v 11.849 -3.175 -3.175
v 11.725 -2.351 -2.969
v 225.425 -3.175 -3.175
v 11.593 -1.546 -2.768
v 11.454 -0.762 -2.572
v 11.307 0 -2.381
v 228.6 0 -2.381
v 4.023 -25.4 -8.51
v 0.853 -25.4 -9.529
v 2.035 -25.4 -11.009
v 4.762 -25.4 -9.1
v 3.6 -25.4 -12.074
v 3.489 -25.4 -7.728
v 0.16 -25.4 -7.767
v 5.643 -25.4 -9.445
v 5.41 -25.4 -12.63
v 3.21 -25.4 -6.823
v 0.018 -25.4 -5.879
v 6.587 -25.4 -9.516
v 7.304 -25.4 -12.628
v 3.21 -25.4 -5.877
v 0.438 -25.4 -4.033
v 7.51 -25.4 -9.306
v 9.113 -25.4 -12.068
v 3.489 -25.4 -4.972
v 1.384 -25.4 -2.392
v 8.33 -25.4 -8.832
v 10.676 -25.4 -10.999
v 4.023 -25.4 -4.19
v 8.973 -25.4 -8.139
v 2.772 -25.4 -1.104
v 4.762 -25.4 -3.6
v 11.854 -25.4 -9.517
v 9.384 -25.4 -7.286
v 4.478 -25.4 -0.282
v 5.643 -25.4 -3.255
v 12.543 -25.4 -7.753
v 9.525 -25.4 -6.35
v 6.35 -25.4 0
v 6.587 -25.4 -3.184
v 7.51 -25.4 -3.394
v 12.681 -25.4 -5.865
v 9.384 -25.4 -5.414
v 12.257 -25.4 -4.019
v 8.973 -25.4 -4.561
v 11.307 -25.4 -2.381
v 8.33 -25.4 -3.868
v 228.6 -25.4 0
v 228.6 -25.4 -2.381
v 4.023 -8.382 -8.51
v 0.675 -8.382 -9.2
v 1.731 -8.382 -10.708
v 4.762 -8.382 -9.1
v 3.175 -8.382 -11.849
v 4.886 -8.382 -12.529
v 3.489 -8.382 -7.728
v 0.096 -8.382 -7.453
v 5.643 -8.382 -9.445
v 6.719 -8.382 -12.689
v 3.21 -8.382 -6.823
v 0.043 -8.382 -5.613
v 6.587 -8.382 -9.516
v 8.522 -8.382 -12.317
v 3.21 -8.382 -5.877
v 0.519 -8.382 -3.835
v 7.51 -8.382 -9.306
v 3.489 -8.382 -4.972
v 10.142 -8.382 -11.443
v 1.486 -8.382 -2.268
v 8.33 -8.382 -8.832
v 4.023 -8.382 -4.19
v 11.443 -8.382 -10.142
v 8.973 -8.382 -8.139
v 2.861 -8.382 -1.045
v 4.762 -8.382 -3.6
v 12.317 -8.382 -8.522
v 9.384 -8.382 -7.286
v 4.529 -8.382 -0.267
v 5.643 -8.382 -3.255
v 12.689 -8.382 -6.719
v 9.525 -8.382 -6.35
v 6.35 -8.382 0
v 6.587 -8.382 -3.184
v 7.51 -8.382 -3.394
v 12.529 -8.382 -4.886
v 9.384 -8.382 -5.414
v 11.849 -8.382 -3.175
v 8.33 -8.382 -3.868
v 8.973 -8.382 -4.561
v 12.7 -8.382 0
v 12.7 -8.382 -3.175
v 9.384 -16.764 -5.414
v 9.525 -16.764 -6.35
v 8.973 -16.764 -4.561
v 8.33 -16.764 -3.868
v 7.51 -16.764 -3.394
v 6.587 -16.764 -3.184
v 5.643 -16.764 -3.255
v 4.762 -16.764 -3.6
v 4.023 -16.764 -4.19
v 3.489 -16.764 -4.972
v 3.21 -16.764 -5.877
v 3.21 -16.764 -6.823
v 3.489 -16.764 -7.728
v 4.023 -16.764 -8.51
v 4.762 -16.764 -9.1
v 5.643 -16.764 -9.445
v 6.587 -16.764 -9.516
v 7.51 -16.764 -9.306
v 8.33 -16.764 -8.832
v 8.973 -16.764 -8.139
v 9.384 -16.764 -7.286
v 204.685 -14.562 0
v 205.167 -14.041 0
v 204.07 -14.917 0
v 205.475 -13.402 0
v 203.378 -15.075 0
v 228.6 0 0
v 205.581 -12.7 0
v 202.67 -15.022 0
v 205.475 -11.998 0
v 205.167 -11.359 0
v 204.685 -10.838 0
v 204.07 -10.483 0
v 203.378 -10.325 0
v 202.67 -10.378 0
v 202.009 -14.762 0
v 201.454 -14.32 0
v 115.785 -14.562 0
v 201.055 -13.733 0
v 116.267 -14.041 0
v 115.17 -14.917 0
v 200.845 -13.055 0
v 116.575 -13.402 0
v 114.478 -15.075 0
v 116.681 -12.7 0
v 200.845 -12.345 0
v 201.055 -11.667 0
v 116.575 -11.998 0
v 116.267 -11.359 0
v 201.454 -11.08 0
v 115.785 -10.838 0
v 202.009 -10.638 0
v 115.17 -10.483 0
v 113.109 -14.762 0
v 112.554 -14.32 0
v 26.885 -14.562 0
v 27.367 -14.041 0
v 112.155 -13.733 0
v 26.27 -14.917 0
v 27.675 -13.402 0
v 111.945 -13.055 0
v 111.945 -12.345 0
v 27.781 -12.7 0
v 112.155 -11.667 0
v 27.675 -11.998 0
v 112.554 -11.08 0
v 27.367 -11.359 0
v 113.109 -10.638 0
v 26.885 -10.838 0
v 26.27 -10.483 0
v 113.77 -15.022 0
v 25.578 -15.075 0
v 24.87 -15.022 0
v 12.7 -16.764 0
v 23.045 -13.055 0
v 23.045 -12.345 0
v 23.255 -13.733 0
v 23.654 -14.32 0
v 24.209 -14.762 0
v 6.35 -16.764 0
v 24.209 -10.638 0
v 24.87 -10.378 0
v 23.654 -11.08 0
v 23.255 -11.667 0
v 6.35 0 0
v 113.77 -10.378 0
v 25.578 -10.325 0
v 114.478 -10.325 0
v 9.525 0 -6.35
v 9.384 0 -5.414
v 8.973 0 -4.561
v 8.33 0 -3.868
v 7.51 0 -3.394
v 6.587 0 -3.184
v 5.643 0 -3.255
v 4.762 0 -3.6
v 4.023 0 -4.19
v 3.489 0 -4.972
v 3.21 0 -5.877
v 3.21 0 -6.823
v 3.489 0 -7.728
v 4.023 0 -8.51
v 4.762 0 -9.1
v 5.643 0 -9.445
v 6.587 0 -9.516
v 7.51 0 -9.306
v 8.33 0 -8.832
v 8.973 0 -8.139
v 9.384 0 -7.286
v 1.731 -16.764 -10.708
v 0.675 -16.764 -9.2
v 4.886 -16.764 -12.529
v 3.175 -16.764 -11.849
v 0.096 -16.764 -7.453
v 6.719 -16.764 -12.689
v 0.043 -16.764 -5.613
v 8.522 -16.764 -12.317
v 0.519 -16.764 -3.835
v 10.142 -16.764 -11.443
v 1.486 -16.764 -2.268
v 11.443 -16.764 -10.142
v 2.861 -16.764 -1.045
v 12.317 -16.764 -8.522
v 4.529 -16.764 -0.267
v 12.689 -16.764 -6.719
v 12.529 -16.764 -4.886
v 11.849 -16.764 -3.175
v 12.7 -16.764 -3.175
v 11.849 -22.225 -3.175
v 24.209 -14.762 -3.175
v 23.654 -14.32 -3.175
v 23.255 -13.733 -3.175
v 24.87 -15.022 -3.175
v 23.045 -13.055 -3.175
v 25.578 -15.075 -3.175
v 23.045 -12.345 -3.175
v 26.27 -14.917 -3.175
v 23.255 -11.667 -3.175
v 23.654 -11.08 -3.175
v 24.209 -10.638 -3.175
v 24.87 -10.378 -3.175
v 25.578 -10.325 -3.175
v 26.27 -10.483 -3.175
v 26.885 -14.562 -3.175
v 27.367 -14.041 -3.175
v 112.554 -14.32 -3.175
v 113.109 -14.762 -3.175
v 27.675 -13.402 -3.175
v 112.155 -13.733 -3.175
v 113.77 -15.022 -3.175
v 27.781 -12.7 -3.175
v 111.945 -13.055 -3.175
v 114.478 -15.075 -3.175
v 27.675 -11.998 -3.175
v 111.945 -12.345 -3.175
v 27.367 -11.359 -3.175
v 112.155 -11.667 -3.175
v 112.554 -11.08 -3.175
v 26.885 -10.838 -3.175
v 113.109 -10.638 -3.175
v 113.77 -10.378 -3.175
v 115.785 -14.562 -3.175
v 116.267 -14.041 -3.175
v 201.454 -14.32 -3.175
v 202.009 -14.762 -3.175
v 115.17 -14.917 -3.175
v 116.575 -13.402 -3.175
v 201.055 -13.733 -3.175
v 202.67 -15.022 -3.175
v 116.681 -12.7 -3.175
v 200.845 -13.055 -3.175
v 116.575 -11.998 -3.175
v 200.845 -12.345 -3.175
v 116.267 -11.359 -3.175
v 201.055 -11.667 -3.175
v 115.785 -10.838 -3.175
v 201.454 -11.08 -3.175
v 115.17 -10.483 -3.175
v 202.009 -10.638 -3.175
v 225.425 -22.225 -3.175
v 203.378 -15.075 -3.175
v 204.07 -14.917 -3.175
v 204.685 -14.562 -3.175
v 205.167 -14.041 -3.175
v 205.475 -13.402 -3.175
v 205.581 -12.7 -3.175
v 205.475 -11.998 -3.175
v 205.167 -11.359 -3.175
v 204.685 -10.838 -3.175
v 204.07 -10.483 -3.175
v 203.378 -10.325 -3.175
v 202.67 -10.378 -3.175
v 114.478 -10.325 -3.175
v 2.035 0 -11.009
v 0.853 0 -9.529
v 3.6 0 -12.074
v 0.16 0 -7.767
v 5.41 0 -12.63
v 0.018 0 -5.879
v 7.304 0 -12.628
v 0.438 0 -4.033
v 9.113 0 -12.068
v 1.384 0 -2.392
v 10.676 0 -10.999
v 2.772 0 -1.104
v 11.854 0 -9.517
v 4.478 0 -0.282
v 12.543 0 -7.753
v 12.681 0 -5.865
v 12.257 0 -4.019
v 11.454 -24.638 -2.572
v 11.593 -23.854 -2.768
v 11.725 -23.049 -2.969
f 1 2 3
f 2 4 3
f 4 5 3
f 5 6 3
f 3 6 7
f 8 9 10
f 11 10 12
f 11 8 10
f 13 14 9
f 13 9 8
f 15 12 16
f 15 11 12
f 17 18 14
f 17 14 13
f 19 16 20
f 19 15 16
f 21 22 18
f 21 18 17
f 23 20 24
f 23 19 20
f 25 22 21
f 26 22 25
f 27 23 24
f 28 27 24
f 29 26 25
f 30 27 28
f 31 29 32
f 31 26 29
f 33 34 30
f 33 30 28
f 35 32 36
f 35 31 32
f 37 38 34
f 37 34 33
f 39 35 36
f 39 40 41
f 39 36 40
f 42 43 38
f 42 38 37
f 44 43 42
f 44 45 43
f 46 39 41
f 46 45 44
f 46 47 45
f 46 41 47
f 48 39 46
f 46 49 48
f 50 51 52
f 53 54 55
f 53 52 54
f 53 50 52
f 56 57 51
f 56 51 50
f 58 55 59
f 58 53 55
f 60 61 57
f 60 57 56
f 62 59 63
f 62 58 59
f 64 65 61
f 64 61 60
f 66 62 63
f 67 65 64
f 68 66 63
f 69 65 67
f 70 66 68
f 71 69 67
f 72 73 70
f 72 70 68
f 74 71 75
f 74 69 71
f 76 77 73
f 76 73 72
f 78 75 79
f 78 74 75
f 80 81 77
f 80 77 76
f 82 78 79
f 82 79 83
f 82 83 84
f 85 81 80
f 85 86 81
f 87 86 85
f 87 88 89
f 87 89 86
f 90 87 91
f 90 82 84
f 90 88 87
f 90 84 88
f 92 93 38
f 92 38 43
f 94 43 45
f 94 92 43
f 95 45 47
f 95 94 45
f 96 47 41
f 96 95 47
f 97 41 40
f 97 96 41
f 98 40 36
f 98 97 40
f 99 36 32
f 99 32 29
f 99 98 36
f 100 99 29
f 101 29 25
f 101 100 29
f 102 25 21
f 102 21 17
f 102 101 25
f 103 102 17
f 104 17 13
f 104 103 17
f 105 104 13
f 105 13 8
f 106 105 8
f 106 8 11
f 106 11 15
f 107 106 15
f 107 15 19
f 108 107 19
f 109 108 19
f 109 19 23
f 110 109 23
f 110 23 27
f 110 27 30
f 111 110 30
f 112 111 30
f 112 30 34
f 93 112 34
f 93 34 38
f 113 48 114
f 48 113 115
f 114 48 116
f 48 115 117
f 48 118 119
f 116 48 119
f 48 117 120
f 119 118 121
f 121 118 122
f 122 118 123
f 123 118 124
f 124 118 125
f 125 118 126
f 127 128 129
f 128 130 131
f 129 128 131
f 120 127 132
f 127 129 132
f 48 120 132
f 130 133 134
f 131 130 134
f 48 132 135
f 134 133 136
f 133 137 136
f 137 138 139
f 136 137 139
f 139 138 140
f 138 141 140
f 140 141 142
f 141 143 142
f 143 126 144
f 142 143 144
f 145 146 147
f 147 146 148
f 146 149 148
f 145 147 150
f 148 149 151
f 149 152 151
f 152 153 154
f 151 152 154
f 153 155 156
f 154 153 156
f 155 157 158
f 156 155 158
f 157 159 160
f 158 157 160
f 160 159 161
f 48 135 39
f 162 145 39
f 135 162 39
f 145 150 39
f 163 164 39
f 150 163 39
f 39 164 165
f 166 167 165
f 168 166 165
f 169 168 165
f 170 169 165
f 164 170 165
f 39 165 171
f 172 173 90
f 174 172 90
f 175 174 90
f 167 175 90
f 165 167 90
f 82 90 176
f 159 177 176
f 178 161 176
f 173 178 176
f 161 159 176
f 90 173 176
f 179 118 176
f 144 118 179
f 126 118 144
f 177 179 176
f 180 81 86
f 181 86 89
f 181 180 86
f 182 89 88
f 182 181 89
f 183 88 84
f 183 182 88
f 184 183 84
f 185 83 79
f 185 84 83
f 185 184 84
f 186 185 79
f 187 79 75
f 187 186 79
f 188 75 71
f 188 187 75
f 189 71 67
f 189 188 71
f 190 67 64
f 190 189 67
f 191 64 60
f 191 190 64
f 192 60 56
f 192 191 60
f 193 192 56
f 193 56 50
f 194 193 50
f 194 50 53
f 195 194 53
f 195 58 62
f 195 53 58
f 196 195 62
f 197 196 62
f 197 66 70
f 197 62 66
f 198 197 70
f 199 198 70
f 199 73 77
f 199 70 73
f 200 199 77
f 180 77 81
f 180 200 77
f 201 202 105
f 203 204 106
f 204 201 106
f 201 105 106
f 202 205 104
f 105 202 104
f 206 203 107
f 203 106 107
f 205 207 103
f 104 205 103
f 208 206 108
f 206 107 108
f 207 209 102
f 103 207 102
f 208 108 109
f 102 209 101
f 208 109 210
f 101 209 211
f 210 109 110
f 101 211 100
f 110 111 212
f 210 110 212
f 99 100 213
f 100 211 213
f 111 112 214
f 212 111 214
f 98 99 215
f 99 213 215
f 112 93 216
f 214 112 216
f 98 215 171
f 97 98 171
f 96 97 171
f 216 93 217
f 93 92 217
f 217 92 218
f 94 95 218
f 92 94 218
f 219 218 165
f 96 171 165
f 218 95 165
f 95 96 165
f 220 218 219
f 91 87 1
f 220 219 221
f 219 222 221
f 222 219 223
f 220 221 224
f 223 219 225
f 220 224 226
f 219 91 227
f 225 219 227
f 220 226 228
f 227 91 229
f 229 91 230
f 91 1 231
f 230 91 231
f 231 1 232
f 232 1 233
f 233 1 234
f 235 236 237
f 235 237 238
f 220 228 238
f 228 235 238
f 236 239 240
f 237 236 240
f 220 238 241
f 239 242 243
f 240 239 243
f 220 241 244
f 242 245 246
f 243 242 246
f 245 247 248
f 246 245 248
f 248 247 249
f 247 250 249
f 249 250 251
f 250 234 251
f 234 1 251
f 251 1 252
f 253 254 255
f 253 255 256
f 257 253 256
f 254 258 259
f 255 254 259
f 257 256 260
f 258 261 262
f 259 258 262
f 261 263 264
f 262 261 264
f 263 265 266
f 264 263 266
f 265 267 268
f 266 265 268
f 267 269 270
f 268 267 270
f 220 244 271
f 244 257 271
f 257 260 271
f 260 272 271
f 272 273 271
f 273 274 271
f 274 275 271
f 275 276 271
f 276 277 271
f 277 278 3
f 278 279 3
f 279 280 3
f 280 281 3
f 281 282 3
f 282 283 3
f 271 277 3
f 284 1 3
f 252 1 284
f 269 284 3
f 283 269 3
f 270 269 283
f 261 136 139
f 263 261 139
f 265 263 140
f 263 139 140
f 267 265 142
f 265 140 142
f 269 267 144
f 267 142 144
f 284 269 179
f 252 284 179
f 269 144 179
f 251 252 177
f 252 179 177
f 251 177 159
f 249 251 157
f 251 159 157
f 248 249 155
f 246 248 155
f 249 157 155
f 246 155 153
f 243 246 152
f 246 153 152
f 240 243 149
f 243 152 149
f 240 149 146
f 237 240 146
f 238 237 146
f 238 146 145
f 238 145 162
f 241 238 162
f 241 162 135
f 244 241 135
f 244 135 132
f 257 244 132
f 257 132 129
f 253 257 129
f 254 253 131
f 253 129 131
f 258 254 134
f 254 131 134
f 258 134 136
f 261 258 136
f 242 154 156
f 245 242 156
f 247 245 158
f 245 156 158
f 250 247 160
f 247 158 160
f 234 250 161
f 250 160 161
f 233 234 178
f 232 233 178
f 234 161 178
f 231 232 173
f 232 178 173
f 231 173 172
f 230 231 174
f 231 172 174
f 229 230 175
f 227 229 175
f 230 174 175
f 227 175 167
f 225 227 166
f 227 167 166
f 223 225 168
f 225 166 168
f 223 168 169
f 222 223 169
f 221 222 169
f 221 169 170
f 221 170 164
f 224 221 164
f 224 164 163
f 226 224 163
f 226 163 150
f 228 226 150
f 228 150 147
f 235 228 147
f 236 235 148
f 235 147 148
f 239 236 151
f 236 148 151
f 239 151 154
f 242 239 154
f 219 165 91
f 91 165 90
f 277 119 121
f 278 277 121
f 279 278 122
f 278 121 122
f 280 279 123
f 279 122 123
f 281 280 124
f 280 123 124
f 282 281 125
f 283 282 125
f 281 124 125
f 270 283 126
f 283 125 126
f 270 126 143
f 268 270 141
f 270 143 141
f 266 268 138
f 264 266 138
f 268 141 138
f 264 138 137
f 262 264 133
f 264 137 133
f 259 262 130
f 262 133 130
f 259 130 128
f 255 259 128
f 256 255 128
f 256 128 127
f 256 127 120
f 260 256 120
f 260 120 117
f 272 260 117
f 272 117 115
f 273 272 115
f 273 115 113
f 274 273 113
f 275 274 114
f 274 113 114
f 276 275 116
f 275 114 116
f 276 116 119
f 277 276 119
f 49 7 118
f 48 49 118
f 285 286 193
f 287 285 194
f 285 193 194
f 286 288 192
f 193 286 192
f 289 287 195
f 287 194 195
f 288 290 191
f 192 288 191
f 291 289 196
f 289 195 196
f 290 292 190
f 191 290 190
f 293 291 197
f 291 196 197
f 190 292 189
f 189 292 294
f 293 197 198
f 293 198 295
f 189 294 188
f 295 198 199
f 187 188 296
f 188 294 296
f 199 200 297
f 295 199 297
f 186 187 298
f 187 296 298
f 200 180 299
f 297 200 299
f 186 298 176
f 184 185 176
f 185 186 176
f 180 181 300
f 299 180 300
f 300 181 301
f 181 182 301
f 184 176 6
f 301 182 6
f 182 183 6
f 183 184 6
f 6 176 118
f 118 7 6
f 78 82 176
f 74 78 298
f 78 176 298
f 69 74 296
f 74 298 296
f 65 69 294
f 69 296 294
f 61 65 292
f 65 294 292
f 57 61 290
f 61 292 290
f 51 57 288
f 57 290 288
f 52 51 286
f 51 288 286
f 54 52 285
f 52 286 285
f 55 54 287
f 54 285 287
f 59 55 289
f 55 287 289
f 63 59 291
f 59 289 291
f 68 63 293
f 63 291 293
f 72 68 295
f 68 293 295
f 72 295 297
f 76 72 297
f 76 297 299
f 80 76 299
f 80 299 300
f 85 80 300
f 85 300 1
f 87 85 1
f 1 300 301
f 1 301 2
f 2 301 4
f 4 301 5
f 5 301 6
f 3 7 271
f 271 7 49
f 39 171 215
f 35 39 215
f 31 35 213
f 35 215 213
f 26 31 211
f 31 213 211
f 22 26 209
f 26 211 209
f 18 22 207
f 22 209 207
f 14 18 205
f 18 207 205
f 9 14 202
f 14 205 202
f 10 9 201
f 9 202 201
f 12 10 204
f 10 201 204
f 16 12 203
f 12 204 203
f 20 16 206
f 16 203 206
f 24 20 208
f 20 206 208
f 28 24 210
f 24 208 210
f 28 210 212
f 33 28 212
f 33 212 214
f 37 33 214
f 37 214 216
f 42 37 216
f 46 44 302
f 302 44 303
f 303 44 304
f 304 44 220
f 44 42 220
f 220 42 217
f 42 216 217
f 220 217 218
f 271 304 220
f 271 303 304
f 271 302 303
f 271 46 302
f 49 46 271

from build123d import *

# Parameters (mm, degrees)
F0_R     = 3.175
F1_DEPTH = 25.4
F2_R     = 2.38125
F3_DEPTH = 3.175
F4_W     = 12.7
F4_H     = 8.382
F5_DEPTH = 12.701
F6_SIZE2 = 0.79375
F6_SIZE  = 3.175


with BuildPart() as f1:
    # F0 (on Front) → F1 (new body)
    with BuildSketch(Plane.XZ):
        with BuildLine():
            Line((228.6, 0), (6.35, 0))
            ThreePointArc((6.35, 0), (3.175, -11.849261314), (11.849261314, -3.175))
            Line((11.849261314, -3.175), (228.6, -3.175))
            Line((228.6, -3.175), (228.6, 0))
        make_face()
        with Locations((6.35, -6.35)):
            Circle(F0_R, mode=Mode.SUBTRACT)
    extrude(amount=F1_DEPTH)

    # F2 (on face) → F3 (cut, through all)
    with BuildSketch(Plane.XY):
        with Locations((203.2, -12.7)):
            Circle(F2_R)
        with Locations((114.3, -12.7)):
            Circle(F2_R)
        with Locations((25.4, -12.7)):
            Circle(F2_R)
    extrude(amount=-F3_DEPTH, mode=Mode.SUBTRACT)

    # F4 (on face) → F5 (cut, through all)
    with BuildSketch(Plane.XY):
        with Locations((6.35, -12.573)):
            Rectangle(F4_W, F4_H)
    extrude(amount=-F5_DEPTH, mode=Mode.SUBTRACT)

    # F6
    f6_edges = [f1.edges().sort_by_distance(p)[0] for p in [
        (120.224631, -25.4, -3.175),
        (120.224631, 0, -3.175),
        (228.6, -12.7, -3.175),
    ]]
    f6_side = f1.faces().sort_by_distance((120.424157, -12.700166, -3.175))[0]
    chamfer(f6_edges, length=F6_SIZE, length2=F6_SIZE2, reference=f6_side)


solid = f1.part
